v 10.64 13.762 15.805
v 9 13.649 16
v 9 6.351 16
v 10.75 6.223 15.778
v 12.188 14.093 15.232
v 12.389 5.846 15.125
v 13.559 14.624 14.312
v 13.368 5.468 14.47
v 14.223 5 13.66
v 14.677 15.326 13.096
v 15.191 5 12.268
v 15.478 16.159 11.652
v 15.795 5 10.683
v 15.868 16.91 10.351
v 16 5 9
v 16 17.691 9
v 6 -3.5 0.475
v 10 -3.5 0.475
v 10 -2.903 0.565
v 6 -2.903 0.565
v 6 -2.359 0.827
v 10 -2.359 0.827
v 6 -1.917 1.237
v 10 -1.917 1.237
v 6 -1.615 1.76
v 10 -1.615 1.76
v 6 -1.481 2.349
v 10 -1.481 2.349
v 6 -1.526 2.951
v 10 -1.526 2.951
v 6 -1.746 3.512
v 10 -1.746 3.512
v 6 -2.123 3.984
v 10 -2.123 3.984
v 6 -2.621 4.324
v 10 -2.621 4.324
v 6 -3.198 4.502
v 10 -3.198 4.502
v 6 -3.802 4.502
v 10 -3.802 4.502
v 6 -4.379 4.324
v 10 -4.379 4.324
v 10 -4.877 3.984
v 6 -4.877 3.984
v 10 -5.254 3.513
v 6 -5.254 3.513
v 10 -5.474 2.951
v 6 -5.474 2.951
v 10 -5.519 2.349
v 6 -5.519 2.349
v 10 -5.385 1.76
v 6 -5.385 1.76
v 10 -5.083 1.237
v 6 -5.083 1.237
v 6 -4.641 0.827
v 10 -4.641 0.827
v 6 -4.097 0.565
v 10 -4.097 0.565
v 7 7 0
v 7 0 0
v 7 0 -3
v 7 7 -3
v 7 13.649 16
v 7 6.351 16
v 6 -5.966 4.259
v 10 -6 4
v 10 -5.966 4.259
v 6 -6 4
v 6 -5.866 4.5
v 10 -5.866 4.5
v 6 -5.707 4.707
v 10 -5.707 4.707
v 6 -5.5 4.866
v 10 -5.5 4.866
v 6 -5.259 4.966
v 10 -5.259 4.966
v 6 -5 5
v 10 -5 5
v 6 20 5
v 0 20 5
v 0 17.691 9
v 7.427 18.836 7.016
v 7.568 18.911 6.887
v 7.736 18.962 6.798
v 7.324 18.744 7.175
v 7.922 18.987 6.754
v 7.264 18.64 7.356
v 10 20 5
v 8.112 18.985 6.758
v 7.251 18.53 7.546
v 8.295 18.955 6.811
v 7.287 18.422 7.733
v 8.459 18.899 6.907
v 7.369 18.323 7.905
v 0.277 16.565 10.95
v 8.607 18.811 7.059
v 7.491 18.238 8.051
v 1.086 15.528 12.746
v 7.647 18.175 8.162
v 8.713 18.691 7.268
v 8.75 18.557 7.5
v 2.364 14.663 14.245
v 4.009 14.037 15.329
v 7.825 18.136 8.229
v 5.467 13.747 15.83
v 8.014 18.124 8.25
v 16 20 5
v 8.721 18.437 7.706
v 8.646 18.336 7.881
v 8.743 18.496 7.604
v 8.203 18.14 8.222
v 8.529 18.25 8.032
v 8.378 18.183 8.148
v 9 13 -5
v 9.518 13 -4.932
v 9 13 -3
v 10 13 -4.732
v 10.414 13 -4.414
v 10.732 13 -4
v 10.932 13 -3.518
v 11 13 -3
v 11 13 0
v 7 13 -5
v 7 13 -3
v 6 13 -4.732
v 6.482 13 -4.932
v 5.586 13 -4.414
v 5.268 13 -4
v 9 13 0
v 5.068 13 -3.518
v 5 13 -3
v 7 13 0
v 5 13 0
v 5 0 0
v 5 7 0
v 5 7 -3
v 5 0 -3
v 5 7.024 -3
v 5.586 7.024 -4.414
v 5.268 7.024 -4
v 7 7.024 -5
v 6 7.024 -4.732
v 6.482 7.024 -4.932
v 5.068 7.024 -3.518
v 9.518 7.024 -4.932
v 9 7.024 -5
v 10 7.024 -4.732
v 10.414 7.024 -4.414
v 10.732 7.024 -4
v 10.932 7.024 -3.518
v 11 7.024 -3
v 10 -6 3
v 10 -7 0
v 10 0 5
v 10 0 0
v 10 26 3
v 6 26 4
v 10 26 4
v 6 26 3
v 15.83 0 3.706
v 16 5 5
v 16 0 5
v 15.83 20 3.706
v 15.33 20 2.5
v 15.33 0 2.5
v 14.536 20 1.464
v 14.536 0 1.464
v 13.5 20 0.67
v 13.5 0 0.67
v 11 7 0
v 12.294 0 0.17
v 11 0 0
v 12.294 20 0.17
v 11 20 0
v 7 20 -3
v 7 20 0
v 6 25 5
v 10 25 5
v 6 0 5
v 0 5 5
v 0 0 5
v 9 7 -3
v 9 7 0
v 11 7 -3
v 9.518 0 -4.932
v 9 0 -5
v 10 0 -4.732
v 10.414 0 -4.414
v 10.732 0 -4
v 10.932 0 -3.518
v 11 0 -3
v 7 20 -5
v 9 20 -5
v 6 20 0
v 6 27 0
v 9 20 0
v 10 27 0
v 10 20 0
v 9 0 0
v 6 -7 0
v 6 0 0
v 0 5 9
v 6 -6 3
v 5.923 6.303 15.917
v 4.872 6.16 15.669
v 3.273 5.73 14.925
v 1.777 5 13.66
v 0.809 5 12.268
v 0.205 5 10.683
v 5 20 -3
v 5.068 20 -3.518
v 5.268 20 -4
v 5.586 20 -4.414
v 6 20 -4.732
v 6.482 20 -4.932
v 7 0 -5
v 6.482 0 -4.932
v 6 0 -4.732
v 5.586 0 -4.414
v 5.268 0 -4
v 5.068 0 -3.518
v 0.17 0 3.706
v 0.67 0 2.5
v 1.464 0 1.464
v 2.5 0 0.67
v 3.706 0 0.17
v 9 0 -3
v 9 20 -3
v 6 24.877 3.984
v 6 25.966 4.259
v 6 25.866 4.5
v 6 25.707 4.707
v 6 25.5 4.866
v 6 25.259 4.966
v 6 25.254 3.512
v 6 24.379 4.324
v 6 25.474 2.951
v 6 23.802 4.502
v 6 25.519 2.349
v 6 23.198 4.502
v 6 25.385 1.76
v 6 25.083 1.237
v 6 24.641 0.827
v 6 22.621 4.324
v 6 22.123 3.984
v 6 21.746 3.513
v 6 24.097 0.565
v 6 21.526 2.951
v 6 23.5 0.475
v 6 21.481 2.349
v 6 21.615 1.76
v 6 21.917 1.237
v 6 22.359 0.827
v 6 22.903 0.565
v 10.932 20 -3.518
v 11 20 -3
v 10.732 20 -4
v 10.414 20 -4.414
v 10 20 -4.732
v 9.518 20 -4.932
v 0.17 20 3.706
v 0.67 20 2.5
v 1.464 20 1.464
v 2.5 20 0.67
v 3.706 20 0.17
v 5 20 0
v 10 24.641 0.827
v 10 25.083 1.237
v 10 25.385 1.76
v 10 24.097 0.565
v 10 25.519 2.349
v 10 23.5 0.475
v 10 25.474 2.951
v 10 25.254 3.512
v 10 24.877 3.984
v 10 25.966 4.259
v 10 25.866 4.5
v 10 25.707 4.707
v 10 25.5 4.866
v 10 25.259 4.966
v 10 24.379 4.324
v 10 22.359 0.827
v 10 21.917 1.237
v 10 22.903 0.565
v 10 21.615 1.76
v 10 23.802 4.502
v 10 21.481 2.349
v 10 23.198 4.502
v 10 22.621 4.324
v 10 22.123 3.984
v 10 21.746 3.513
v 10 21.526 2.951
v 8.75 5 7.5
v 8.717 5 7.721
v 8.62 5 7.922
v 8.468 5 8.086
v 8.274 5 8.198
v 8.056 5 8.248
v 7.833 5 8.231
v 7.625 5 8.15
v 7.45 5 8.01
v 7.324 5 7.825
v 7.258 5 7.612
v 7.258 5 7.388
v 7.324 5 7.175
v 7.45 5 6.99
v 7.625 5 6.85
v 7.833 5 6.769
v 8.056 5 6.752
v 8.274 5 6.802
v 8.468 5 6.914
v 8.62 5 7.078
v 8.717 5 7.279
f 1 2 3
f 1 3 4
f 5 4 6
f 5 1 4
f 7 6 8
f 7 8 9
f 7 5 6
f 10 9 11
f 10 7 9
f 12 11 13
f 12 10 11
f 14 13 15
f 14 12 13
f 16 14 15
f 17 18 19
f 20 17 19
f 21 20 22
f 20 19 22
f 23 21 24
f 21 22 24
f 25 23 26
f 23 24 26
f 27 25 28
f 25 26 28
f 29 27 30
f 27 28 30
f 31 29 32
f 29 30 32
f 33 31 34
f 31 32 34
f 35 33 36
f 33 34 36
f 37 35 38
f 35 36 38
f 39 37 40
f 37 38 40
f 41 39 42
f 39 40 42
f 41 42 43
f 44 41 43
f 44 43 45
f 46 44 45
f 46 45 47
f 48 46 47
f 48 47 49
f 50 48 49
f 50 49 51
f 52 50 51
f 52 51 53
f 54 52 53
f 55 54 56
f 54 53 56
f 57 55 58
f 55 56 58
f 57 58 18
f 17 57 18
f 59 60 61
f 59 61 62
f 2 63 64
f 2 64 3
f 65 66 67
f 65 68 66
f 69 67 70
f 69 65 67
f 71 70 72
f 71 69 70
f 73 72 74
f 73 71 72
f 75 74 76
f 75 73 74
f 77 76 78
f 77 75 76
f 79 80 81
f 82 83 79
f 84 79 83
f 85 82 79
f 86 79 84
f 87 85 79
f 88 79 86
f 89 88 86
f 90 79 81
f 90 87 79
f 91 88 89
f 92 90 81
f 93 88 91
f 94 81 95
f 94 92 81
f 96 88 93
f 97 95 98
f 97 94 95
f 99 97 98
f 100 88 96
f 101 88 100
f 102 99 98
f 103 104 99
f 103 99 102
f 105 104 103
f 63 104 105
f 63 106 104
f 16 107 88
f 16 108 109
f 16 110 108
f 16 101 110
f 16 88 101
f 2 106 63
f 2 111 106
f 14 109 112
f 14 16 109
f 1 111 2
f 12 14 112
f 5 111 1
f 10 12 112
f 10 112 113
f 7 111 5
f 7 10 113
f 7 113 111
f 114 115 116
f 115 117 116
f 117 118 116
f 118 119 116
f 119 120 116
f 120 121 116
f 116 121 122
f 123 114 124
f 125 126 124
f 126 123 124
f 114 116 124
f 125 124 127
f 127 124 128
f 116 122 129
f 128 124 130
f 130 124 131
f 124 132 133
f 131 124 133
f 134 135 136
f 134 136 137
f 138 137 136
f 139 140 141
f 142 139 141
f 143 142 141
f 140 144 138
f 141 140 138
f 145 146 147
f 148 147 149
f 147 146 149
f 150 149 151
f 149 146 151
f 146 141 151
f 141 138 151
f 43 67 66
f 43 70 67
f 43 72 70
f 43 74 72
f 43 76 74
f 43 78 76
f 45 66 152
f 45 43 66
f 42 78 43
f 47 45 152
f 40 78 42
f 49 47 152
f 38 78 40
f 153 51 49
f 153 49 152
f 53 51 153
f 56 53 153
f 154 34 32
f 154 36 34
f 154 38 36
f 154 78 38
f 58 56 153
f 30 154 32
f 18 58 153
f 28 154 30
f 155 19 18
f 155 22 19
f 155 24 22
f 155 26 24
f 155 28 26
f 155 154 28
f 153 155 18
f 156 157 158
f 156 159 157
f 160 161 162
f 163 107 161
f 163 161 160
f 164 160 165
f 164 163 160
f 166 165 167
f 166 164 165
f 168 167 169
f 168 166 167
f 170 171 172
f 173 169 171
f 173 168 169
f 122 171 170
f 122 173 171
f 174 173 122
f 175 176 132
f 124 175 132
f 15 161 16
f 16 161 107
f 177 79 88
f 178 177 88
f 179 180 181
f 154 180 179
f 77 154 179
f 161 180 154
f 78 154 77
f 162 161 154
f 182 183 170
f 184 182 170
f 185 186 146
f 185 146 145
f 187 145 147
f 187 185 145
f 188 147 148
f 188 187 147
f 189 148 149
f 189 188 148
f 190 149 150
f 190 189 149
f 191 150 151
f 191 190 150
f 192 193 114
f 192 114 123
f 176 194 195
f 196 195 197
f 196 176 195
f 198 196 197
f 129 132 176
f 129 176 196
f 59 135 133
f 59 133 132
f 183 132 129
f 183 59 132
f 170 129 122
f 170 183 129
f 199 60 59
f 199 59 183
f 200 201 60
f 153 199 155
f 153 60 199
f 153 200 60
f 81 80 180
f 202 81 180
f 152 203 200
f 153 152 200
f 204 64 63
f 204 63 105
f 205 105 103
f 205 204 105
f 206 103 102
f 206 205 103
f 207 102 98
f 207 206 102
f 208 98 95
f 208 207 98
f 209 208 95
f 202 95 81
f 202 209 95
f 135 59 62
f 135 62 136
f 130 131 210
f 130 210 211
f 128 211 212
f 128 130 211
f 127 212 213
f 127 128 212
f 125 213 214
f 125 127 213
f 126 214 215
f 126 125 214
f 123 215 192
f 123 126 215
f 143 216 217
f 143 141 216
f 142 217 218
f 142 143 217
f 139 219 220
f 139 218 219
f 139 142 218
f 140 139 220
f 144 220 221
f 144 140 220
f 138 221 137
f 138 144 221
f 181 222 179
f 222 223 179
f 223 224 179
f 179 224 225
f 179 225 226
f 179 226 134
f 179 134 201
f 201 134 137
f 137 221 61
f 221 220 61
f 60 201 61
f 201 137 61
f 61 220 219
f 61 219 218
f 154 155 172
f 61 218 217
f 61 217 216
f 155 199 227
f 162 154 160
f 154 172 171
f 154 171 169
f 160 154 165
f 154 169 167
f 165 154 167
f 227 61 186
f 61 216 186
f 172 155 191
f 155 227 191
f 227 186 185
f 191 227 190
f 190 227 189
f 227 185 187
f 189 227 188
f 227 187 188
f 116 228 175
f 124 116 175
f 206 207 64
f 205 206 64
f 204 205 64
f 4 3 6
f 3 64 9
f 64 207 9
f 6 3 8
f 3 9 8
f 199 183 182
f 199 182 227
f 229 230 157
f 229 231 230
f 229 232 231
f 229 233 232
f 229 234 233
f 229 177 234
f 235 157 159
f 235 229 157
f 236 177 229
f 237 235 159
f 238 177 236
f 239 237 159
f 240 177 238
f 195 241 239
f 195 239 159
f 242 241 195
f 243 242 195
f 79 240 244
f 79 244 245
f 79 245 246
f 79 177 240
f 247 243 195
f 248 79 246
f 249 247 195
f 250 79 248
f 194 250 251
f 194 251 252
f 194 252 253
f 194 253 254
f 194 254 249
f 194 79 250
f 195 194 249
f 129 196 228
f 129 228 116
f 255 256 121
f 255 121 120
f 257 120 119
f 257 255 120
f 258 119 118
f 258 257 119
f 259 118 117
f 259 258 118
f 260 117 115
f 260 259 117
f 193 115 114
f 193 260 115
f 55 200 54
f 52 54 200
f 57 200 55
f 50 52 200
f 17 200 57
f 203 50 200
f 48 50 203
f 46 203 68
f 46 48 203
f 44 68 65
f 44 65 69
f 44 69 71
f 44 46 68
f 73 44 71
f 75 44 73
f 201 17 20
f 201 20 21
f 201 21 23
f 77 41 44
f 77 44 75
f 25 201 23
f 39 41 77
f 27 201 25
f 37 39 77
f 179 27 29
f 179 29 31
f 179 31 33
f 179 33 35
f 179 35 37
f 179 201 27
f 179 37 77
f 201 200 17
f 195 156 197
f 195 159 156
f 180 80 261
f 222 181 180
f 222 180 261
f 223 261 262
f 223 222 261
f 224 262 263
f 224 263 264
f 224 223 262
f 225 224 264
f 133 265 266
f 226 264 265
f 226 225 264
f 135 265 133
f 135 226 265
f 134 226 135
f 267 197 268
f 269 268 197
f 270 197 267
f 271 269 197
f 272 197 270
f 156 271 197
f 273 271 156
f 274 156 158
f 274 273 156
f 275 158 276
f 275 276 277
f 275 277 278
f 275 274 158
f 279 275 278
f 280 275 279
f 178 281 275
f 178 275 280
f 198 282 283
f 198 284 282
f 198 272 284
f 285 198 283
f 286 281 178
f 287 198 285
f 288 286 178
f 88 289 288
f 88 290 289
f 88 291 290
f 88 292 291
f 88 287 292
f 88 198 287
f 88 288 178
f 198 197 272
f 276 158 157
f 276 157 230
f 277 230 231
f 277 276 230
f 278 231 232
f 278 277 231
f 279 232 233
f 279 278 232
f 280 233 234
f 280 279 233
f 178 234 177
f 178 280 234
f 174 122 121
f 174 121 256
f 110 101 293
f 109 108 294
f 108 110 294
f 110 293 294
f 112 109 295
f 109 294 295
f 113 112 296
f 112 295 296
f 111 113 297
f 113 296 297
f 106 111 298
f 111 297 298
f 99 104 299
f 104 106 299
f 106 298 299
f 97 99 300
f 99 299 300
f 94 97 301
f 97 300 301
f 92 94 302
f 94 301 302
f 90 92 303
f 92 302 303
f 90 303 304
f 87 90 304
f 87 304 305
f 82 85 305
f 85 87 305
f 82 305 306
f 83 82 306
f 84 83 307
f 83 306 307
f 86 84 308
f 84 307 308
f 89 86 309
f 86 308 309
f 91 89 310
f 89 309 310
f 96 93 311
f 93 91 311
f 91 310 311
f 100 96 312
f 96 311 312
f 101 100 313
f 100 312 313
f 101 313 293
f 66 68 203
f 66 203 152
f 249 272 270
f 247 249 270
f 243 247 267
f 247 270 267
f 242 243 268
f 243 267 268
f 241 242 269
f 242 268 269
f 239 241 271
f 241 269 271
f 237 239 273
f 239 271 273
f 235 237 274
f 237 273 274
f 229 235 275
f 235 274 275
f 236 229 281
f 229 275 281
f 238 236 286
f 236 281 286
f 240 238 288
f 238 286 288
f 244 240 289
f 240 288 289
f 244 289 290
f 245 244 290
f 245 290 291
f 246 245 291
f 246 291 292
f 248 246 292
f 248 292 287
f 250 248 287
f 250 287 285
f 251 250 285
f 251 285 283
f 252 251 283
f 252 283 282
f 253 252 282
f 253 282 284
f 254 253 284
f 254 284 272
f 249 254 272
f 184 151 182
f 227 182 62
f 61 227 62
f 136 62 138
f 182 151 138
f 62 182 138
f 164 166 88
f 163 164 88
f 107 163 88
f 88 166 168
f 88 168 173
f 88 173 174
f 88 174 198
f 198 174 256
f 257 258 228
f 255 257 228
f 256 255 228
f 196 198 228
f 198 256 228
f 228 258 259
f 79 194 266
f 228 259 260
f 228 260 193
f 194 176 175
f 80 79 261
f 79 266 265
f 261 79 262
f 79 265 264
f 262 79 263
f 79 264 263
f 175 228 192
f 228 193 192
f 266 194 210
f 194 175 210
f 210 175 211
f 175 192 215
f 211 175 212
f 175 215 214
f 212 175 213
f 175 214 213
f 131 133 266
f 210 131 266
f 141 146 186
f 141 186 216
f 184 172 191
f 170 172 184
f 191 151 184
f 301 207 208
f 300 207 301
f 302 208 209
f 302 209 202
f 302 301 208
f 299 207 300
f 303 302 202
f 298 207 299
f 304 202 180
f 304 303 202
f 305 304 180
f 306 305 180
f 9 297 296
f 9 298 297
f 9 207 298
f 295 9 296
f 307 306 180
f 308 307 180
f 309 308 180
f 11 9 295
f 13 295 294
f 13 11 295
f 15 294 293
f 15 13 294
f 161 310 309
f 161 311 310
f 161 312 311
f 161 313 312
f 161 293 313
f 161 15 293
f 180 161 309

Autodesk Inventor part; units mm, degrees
ref_plane "YZ Plane" through (0, 0, 0) normal (1, 0, 0) x (0, 1, 0)
ref_plane "XZ Plane" through (0, 0, 0) normal (0, 1, 0) x (-1, 0, 0)
ref_plane "XY Plane" through (0, 0, 0) normal (0, 0, 1) x (1, 0, 0)
sketch "Sketch3" plane through (0, 0, 0) normal (0, 0, 1) x (1, 0, 0)
  line L0 (0, 0) -> (16, 0)
  line L1 (16, 0) -> (16, 20)
  line L2 (16, 20) -> (0, 20)
  line L3 (0, 20) -> (0, 0)
  dimension "d0" = 16
  dimension "d1" = 20
extrude "Extrusion1" add sketch "Sketch3" along normal blind 16
fillet "Fillet1" radius 7 2 edges at (16, 10, 16) (0, 10, 16)
fillet "Fillet2" radius 5 2 edges at (16, 10, 0) (0, 10, 0)
sketch "Sketch4" plane through (16, 0, 9) normal (1, 0, 0) x (0, 0, -1)
  line L0 (4, 20) -> (0, 20) projected
  line L1 (4, 20) -> (-7, 13.6491)
  line L2 (-7, 20) -> (-7, 0) projected
  line L3 (4, 20) -> (16.7017, 20) construction
  line L4 (-7, 13.6491) -> (-7, 20)
  line L5 (-7, 20) -> (4, 20)
  line L6 (4, 0) -> (0, 0) projected
  line L7 (4, 0) -> (-7, 6.3509)
  line L8 (4, 0) -> (16.7017, 0) construction
  line L9 (-7, 6.3509) -> (-7, 0)
  line L10 (-7, 0) -> (4, 0)
  point P0 (9, 0)
  point P1 (-7, 0)
  point P2 (0, 0)
  dimension "d6" = 150
  dimension "d7" = 150
extrude "Extrusion2" cut sketch "Sketch4" against normal through all
sketch "Sketch5" plane through (5, 20, 0) normal (0, 1, 0) x (1, 0, 0)
  line L0 (-5, -9) -> (-5, -5) projected
  line L1 (0, 0) -> (6, 0) projected
  line L2 (5, 0) -> (1, 0)
  line L3 (1, 0) -> (1, -5)
  line L4 (1, -5) -> (5, -5)
  line L5 (5, -5) -> (5, 0)
  line L6 (1, 0) -> (5, 0)
  point P0 (-5, 0)
  dimension "d47" = 4
extrude "Extrusion3" add sketch "Sketch5" along normal blind 6
sketch "Sketch11" plane through (0, 0, 0) normal (0, 0, -1) x (-1, 0, 0)
  line L0 (-11, 0) -> (-11, 20) projected
  line L1 (-9, 13.6491) -> (-9, 6.3509) projected
  line L2 (-11, 0) -> (-9, 0)
  line L3 (-9, 0) -> (-9, 7)
  line L4 (-9, 7) -> (-11, 7)
  line L5 (-11, 7) -> (-11, 0)
  line L6 (-5, 0) -> (-7, 0)
  line L7 (-7, 0) -> (-7, 7)
  line L8 (-7, 7) -> (-5, 7)
  line L9 (-5, 7) -> (-5, 0)
  line L10 (-11, 20) -> (-9, 20)
  line L11 (-9, 20) -> (-9, 13)
  line L12 (-9, 13) -> (-11, 13)
  line L13 (-11, 13) -> (-11, 20)
  line L14 (-5, 20) -> (-7, 20)
  line L15 (-7, 20) -> (-7, 13)
  line L16 (-7, 13) -> (-5, 13)
  line L17 (-5, 13) -> (-5, 20)
  point P0 (0, 0)
  point P1 (-9, 6.3509)
  point P2 (-11, 13)
  dimension "d32" = 7
  dimension "d33" = 2
  dimension "d34" = 7
  dimension "d35" = 7
  dimension "d36" = 7
extrude "Extrusion9" add sketch "Sketch11" along normal blind 3 contours L0 L4 L1 L3 L2 | L0 L10 L11 L1 L12 | L6 L7 L8 L9 | L17 L16 L15 L14
sketch "Sketch12" plane through (0, 0, -3) normal (0, 0, -1) x (-1, 0, 0)
  line L0 (-9, 20) -> (-11, 20) projected
  line L1 (-5, 13) -> (-7, 13) projected
  line L2 (-11, 20) -> (-5, 20)
  line L3 (-5, 20) -> (-5, 13)
  line L4 (-5, 13) -> (-11, 13)
  line L5 (-11, 13) -> (-11, 20)
  line L6 (-11, 0) -> (-16, 0) projected
  line L7 (-11, 0) -> (-5, 0)
  line L8 (-5, 0) -> (-5, 7.0241)
  line L9 (-5, 7.0241) -> (-11, 7.0241)
  line L10 (-11, 7.0241) -> (-11, 0)
  point P0 (0, 0)
  point P1 (-5, -20)
  point P2 (-11, -13)
extrude "Extrusion10" add sketch "Sketch12" along normal blind 2
sketch "Sketch13" plane through (0, 0, 5) normal (0, -1, 0) x (1, 0, 0)
  circle A0 centre (8, 2.5) radius 0.75
  point P0 (0, -5)
  dimension "d42" = 1.5
extrude "Extrusion11" cut sketch "Sketch13" against normal through all
fillet "Fillet4" radius 2 4 edges at (11, 16.5, -5) (5, 16.5, -5) (5, 3.5121, -5) (11, 3.5121, -5)
sketch "Sketch14" plane through (10, 20, 5) normal (1, 0, 0) x (0, 0, -1)
  circle A0 centre (2.5, 3.5) radius 2.025
  line L0 (0, 6) -> (5, 6) projected
  point P0 (5, -20)
  dimension "d48" = 4.05
  dimension "d59" = 2.5
extrude "Extrusion12" cut sketch "Sketch14" against normal blind 5
sketch "Sketch15" plane through (0, 0, 5) normal (0, -1, 0) x (1, 0, 0)
  line L0 (10, -5) -> (10, 0) projected
  line L1 (10, 0) -> (6, 0)
  line L2 (6, 0) -> (6, -5)
  line L3 (6, -5) -> (10, -5)
  line L4 (10, -5) -> (10, 0)
  point P0 (0, -5)
  point P1 (10, -0.475)
  point P2 (6, -0.475)
  dimension "d60" = 5
  dimension "d61" = 4
extrude "Extrusion13" add sketch "Sketch15" along normal blind 6
sketch "Sketch16" plane through (10, 0, 5) normal (1, 0, 0) x (0, 0, -1)
  circle A0 centre (2.5, -3.5) radius 2.025
  line L0 (5, -6) -> (0, -6) projected
  point P0 (5, 0)
  dimension "d54" = 4.05
  dimension "d58" = 2.5
extrude "Extrusion14" cut sketch "Sketch16" against normal blind 5
fillet "Fillet7" radius 1 1 edges at (8, -6, 5)
sketch "Sketch17" plane through (0, -6, 5) normal (0, -1, 0) x (1, 0, 0)
  line L0 (6, -5) -> (10, -5) projected
  line L1 (6, -4.525) -> (6, -0.475) projected
  line L2 (10, -5) -> (6, -5)
  line L3 (6, -5) -> (6, -2)
  line L4 (6, -2) -> (10, -2)
  line L5 (10, -2) -> (10, -5)
  point P0 (0, -5)
  point P1 (6, -5)
  dimension "d63" = 3
extrude "Extrusion15" add sketch "Sketch17" along normal blind 1
fillet "Fillet8" radius 1 1 edges at (8, 26, 5)
sketch "Sketch18" plane through (5, 26, 0) normal (0, 1, 0) x (1, 0, 0)
  line L0 (1, -3) -> (5, -3) projected
  line L1 (1, -5) -> (1, 0) projected
  line L2 (5, -3) -> (1, -3)
  line L3 (1, -3) -> (1, 0)
  line L4 (1, 0) -> (5, 0)
  line L5 (5, 0) -> (5, -3)
  point P0 (-5, 0)
extrude "Extrusion16" add sketch "Sketch18" along normal blind 1
sketch "Sketch19" plane through (6, 0, 0) normal (-1, 0, 0) x (0, 0, 1)
  line L0 (3, -6) -> (3, -7) projected
  line L1 (0, 0) -> (0, -7) projected
  line L2 (3, -6) -> (0, -7)
  line L3 (0, -7) -> (3, -7)
  line L4 (3, -7) -> (3, -6)
extrude "Extrusion17" cut sketch "Sketch19" against normal through all
sketch "Sketch20" plane through (6, 20, 0) normal (-1, 0, 0) x (0, 0, 1)
  line L0 (4, 6) -> (3, 6) projected
  line L1 (0, 0) -> (0, 7) projected
  line L2 (3, 6) -> (0, 7)
  line L3 (0, 7) -> (3, 7)
  line L4 (3, 7) -> (3, 6)
  point P0 (0, -20)
extrude "Extrusion18" cut sketch "Sketch20" against normal through all
sketch "Sketch22" plane through (16, 0, 5) normal (1, 0, 0) x (0, 0, -1)
  point P0 (5, 0)
sketch "Sketch23" plane through (16, 0, 5) normal (1, 0, 0) x (0, 0, -1)
  line L0 (0, 0) -> (-4, 2.3094) projected
  line L1 (-4, 2.3094) -> (-11, 6.3509) projected
  line L2 (0, 0) -> (-8.6603, 0)
  line L3 (-8.6603, 0) -> (-8.6603, 5)
  line L4 (-8.6603, 5) -> (0, 5)
  line L5 (0, 5) -> (0, 0)
  point P0 (5, 0)
  dimension "d75" = 5
extrude "Extrusion20" cut sketch "Sketch23" against normal through all contours L0 L1 L4 L5
properties part number "FingerMiddle"
